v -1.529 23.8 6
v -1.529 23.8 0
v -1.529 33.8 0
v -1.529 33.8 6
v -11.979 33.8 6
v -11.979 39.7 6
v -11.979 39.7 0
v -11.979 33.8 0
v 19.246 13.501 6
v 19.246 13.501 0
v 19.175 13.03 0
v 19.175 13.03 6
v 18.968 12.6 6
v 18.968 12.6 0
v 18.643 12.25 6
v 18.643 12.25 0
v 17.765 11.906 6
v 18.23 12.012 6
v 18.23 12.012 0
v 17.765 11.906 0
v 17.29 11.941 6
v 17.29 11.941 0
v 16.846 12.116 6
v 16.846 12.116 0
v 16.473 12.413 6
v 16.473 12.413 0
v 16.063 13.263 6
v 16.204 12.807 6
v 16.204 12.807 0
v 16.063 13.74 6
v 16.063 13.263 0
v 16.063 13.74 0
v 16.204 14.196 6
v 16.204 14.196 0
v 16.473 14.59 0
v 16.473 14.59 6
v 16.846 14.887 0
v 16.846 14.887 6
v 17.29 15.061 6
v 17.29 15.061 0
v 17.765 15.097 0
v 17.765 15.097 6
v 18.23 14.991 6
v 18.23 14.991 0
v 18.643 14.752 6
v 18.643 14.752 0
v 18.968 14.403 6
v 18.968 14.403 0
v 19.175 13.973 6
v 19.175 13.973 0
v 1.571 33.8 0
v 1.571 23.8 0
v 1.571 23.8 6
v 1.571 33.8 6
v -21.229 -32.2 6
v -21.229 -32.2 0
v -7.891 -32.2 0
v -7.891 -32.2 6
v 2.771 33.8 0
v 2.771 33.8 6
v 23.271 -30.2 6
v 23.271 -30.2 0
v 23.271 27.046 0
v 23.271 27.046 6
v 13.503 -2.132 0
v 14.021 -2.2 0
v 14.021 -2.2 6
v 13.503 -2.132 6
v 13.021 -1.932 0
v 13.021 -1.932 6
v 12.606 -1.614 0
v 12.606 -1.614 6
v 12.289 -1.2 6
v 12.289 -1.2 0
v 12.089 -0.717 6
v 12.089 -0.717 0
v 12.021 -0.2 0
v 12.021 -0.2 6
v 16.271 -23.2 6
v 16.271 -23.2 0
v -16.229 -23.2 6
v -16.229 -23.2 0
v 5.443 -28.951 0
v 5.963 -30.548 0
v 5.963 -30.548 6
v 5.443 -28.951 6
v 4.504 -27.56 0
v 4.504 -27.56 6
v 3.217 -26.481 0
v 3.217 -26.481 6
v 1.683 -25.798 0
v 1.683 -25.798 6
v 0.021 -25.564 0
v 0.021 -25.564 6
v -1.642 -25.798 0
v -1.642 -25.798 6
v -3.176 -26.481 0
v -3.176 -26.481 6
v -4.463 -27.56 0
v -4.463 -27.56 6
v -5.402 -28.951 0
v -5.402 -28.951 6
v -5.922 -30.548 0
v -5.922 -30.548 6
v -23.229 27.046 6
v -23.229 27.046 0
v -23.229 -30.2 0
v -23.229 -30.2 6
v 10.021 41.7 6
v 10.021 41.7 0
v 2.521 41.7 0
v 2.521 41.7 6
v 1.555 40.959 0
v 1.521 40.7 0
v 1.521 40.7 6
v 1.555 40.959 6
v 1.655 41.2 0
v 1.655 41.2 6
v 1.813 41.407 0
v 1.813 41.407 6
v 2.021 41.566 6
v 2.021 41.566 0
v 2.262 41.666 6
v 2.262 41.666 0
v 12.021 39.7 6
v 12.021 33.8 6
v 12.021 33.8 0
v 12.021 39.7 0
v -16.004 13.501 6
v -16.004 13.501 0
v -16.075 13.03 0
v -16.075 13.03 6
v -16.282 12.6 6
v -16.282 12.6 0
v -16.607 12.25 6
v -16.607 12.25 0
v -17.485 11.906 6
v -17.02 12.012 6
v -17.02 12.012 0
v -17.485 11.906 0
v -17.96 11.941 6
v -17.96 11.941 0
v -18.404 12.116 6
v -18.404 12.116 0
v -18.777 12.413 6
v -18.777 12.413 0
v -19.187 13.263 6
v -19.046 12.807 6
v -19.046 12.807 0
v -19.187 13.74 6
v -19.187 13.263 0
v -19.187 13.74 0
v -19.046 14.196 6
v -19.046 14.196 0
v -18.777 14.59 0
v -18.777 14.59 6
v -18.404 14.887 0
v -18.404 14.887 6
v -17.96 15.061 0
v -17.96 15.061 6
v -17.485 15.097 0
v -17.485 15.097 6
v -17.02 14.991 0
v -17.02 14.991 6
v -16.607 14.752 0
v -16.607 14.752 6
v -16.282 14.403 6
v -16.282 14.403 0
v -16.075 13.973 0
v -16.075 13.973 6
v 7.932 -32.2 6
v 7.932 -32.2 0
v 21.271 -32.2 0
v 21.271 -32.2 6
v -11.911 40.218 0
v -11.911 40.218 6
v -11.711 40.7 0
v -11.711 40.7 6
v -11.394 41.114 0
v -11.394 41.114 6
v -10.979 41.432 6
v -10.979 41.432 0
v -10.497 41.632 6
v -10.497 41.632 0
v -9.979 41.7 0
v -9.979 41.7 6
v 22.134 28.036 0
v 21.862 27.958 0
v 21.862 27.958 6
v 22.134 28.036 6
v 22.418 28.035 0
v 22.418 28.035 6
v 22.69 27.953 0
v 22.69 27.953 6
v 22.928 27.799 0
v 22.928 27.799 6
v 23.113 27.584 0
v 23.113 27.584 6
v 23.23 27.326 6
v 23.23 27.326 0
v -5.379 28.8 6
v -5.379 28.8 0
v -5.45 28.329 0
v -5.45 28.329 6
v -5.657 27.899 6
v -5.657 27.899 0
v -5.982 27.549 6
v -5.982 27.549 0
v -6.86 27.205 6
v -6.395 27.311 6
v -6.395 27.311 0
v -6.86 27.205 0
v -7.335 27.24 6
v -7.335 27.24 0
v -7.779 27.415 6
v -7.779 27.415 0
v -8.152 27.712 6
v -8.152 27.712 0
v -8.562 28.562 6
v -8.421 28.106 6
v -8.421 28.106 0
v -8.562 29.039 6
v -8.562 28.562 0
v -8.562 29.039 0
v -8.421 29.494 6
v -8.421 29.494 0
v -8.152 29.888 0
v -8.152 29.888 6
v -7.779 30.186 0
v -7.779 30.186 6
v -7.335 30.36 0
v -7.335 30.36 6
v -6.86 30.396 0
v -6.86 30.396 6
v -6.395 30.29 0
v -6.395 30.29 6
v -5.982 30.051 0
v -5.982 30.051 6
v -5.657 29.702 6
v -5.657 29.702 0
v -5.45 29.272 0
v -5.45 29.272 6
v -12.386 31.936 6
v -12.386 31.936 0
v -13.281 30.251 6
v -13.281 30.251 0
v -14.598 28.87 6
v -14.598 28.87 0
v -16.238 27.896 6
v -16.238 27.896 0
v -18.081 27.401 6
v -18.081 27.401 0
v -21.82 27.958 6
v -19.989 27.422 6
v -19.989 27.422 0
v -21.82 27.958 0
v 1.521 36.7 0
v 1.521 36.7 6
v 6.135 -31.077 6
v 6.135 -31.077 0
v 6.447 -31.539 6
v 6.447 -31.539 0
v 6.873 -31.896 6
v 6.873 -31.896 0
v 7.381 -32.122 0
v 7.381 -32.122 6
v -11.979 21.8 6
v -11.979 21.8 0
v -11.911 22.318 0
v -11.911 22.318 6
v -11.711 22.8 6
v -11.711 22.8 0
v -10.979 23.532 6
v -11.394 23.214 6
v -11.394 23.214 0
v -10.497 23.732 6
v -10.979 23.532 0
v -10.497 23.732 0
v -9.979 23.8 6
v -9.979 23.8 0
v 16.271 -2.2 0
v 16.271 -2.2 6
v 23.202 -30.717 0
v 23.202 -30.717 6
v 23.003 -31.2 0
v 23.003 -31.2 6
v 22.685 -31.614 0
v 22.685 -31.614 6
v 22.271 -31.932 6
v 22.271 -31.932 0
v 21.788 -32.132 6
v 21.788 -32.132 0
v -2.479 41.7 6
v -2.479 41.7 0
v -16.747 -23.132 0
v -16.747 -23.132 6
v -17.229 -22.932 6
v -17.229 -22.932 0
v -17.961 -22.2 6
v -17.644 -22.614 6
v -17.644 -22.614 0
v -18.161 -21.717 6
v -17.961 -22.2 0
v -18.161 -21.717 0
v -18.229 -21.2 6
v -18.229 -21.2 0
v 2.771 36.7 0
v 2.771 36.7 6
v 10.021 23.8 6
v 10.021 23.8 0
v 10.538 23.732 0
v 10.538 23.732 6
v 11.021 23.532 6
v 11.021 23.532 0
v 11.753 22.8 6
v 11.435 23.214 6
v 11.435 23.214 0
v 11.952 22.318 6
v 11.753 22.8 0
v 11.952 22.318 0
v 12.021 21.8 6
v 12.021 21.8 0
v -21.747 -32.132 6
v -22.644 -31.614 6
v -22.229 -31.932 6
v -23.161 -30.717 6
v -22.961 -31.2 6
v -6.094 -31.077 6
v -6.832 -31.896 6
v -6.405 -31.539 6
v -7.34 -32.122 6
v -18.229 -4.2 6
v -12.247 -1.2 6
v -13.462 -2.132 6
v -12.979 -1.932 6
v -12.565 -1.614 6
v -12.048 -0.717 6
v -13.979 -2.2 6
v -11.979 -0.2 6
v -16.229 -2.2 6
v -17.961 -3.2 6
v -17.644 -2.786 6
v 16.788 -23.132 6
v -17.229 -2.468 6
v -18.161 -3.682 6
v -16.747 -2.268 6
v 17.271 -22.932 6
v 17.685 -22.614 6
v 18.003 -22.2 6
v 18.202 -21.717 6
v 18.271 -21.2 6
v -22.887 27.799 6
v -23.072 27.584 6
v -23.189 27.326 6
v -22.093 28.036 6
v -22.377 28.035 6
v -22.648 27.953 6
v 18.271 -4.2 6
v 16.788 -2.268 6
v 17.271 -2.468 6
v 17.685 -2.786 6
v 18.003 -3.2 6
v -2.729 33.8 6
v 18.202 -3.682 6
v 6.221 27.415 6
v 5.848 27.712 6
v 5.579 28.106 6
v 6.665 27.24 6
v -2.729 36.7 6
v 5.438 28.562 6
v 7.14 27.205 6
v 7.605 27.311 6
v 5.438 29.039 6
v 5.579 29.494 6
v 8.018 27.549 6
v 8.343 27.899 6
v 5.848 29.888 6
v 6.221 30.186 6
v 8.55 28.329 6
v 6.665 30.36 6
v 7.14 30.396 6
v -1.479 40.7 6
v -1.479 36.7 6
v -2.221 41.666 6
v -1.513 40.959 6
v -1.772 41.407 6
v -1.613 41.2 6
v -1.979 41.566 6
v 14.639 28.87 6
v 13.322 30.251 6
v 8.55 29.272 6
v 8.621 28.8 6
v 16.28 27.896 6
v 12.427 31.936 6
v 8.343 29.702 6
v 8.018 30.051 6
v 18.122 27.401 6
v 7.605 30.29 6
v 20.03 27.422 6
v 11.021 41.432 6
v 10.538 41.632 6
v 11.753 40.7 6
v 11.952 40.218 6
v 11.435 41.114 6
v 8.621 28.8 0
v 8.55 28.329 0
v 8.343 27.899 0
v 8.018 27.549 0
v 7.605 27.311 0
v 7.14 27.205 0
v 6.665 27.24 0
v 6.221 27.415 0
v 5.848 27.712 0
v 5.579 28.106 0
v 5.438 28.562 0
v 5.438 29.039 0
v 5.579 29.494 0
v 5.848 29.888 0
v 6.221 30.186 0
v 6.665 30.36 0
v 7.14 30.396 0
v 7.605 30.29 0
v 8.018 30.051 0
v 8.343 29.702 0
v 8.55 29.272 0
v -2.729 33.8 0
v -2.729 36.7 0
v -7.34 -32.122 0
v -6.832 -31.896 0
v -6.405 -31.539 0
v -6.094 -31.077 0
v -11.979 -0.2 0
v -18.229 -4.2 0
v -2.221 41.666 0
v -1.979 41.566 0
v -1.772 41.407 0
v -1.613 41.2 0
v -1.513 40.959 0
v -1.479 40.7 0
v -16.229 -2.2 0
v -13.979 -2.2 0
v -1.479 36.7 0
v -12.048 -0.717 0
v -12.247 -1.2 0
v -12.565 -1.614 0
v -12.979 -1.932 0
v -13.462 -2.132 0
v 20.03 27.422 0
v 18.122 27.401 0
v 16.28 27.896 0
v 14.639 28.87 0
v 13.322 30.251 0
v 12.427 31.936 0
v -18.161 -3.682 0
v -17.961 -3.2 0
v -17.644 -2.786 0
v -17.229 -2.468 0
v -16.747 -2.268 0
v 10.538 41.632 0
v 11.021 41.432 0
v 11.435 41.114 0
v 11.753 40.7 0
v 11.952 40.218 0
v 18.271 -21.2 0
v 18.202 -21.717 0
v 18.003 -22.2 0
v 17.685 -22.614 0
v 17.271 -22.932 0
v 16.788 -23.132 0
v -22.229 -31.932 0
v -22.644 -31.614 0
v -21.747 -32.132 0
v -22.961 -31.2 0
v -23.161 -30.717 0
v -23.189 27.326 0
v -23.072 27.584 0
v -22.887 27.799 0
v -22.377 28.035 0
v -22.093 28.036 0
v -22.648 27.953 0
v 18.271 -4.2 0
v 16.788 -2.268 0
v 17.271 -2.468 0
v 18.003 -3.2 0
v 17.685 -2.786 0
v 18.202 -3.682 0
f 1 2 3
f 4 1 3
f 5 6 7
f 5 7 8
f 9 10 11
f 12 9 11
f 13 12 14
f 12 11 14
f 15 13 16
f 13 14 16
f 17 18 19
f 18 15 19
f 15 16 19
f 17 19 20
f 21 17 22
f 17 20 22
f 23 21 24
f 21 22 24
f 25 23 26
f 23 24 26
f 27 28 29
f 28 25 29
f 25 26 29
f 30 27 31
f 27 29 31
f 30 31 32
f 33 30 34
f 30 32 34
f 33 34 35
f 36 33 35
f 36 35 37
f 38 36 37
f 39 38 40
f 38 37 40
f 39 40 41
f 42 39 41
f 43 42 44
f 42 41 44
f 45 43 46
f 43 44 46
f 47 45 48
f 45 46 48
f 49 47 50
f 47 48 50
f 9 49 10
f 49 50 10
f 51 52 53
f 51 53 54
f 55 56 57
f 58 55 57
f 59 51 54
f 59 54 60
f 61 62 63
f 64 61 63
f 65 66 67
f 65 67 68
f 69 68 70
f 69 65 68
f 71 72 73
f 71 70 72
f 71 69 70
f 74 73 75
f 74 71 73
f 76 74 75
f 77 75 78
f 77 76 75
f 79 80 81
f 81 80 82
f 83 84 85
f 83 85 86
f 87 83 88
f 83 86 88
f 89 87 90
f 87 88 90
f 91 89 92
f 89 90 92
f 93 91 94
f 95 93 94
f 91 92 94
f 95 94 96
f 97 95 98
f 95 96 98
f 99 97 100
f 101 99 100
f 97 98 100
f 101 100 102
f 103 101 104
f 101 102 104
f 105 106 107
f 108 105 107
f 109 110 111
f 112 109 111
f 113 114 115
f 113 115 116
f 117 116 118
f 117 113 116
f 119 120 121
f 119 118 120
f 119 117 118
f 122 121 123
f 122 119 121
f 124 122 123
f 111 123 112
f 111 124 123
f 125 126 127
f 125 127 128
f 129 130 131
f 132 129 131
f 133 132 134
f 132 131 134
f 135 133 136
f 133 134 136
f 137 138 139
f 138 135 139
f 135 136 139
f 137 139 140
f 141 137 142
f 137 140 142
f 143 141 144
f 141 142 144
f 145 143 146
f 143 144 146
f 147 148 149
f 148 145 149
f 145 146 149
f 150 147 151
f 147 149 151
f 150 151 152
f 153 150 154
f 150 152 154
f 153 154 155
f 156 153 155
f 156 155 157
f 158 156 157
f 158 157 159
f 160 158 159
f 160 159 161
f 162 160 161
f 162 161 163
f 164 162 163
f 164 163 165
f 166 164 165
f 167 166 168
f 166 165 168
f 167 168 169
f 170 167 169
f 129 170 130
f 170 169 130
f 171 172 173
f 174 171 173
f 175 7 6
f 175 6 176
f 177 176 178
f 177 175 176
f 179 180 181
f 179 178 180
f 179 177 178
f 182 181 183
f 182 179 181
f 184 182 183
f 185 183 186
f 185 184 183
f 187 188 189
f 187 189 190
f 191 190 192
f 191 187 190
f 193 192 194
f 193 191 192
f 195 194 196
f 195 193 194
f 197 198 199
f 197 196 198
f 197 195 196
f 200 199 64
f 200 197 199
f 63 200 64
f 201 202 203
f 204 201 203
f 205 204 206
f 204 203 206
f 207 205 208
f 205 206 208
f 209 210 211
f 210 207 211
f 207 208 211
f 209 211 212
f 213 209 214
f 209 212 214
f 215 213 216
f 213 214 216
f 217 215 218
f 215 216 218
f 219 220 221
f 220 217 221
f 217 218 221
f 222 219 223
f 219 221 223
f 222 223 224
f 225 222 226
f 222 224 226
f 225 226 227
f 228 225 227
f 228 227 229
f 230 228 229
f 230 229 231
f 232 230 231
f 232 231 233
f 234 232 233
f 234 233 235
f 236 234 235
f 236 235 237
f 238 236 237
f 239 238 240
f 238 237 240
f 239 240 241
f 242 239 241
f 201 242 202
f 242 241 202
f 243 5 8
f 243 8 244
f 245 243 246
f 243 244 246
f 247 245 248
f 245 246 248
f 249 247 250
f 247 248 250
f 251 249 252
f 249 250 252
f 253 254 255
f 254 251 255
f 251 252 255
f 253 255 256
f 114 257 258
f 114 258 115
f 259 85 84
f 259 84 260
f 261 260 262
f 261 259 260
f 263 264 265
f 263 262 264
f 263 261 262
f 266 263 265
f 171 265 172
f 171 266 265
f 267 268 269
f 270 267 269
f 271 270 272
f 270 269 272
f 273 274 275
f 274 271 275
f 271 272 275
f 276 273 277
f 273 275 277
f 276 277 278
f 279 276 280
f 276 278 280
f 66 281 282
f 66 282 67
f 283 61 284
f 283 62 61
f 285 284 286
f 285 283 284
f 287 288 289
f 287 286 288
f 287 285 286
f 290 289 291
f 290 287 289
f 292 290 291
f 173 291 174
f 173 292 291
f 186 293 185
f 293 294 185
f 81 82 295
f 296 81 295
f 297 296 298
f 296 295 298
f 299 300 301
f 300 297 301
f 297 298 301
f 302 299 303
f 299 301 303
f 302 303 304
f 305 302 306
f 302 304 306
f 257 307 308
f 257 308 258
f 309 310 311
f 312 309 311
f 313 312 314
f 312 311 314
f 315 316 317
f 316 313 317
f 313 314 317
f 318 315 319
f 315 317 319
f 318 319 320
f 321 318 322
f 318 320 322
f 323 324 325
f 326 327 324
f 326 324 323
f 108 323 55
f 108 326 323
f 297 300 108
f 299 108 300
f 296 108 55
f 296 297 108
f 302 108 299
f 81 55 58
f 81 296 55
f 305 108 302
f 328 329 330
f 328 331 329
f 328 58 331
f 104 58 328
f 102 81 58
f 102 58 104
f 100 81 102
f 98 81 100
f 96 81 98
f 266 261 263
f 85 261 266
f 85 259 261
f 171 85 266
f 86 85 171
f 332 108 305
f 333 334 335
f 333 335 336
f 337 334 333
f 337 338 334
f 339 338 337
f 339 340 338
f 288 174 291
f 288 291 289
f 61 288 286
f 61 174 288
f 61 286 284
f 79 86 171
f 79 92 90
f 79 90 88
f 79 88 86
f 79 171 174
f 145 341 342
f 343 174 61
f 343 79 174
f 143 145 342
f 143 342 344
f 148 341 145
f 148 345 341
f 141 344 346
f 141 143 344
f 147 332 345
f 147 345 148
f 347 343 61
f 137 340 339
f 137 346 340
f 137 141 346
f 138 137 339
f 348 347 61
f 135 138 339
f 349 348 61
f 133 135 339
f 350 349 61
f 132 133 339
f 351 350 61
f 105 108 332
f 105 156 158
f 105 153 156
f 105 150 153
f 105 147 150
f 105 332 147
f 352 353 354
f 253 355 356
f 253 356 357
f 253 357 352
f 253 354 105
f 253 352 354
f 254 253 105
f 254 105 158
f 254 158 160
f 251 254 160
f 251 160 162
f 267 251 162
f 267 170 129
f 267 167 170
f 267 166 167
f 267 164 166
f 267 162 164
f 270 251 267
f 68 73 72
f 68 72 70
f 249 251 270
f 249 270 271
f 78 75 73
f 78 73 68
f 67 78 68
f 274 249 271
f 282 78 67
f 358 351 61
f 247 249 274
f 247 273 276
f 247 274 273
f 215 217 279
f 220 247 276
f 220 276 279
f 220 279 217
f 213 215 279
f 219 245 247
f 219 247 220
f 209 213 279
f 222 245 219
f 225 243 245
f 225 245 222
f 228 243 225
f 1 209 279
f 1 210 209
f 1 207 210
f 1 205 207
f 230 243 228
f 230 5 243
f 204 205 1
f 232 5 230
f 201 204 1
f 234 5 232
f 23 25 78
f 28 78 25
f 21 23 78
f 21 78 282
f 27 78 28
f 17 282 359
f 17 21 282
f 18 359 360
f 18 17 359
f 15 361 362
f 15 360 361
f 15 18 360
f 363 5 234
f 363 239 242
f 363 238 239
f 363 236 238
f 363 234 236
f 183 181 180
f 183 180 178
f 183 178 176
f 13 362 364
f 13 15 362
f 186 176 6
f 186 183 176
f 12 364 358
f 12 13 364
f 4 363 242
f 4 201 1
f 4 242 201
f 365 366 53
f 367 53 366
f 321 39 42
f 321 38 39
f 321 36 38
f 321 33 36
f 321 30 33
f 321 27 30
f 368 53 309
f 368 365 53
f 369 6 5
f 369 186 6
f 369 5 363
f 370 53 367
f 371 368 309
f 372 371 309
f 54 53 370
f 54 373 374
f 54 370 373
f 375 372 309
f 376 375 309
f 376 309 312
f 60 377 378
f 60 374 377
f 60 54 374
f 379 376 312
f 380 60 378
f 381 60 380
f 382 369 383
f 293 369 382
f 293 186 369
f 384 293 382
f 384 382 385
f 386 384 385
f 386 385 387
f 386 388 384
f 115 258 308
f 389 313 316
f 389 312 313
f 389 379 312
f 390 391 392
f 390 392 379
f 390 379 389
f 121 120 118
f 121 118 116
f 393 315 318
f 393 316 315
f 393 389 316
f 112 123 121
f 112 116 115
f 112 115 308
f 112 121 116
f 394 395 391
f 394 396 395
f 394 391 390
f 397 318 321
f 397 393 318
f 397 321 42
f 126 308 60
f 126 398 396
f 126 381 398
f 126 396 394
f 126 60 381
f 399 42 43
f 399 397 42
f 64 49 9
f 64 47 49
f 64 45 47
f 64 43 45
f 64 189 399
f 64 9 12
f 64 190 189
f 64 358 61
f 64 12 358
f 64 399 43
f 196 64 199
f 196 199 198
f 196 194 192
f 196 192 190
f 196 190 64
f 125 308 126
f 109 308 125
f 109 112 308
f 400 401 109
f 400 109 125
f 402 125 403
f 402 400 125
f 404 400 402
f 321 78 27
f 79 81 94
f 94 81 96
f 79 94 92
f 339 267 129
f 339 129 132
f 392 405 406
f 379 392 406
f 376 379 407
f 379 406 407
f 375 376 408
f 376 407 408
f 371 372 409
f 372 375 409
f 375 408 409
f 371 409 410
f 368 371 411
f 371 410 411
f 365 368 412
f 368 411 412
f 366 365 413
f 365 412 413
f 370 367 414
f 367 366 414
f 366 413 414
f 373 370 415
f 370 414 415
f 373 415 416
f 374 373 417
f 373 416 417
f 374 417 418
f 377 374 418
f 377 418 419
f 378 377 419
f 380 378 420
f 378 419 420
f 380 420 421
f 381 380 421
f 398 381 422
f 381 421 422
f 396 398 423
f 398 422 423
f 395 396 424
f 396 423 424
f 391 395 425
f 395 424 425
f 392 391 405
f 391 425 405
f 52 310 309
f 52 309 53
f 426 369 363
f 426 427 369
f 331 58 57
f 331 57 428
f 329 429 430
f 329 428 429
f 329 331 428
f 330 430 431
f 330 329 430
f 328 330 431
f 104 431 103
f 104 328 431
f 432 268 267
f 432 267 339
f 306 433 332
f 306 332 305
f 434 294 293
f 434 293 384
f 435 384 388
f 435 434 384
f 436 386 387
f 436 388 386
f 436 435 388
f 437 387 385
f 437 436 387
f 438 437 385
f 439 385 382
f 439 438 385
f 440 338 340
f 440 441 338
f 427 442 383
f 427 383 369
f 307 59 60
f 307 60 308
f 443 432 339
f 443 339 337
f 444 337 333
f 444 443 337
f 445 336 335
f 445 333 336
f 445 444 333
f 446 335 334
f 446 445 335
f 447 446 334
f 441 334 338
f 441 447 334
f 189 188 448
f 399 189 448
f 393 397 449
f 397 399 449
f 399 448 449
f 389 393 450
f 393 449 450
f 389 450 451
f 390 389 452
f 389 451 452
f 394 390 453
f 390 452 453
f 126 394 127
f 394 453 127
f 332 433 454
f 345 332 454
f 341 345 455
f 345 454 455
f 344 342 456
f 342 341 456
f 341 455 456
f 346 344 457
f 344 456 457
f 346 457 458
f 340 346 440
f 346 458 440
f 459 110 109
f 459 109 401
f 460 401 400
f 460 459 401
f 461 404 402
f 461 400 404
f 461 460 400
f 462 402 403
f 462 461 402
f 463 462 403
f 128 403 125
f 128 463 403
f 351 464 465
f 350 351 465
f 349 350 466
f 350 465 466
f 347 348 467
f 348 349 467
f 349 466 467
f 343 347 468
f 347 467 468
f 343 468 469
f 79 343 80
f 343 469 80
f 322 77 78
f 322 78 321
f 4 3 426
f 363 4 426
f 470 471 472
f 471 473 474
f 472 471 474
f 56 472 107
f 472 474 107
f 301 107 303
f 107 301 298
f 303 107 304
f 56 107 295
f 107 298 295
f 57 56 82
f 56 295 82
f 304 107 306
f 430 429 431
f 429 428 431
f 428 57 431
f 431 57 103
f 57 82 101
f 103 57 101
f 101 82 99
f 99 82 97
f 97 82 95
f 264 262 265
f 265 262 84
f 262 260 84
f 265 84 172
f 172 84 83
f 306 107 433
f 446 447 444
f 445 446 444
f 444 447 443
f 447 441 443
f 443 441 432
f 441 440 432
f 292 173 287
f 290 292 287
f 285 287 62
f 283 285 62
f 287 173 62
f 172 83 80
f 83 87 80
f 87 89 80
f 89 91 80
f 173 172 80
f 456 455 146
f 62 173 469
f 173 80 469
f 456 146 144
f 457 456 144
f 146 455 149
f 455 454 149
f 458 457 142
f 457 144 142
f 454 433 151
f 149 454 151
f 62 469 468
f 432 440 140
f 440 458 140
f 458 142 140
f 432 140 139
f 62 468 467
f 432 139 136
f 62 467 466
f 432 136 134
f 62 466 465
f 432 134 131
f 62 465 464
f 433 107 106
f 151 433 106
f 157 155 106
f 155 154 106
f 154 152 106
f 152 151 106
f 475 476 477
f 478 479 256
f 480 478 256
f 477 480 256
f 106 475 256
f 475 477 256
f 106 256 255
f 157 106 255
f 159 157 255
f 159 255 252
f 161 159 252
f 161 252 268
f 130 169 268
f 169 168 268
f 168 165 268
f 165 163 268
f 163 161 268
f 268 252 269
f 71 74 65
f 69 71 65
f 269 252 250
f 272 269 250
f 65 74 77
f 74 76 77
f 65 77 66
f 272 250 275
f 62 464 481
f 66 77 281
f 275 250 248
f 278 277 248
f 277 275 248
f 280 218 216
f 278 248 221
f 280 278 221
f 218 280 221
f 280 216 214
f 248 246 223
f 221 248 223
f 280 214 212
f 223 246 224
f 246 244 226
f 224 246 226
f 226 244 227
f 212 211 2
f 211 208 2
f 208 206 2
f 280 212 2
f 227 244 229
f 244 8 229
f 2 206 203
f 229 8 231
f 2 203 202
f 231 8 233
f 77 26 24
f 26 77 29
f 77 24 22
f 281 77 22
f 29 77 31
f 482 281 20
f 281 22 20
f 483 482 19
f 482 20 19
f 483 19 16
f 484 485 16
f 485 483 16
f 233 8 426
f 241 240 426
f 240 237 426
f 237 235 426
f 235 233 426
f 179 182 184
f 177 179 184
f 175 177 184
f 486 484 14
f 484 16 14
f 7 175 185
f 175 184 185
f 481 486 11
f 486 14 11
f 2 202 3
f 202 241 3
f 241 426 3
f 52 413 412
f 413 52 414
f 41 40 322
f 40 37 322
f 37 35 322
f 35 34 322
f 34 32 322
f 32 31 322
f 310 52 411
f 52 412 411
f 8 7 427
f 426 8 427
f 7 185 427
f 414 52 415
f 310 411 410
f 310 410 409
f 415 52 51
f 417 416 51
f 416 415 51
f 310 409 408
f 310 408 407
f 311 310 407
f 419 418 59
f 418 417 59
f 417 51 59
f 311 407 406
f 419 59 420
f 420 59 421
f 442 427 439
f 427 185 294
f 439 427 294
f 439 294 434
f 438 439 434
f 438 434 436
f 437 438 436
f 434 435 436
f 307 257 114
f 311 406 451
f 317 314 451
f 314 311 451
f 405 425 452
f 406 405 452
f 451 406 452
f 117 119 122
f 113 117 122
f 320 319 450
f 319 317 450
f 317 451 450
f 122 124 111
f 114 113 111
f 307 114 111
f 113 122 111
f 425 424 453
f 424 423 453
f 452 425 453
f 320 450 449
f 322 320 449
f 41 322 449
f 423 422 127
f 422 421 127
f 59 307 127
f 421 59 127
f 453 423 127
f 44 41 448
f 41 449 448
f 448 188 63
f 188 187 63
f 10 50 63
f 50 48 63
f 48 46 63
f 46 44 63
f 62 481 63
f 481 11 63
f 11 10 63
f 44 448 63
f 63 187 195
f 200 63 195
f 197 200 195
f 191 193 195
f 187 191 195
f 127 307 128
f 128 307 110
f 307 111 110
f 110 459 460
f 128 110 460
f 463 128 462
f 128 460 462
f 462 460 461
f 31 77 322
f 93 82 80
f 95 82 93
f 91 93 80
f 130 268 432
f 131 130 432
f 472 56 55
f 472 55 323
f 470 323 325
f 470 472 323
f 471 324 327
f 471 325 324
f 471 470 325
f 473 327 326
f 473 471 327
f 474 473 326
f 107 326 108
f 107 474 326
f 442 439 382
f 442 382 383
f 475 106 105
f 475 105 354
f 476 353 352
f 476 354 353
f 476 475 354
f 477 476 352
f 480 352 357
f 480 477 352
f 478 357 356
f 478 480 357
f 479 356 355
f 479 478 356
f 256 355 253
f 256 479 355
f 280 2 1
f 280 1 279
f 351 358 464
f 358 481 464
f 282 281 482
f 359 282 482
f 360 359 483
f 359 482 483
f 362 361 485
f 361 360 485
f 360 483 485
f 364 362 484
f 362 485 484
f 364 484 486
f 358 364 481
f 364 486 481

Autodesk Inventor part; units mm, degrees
ref_plane "YZ Plane" through (0, 0, 0) normal (1, 0, 0) x (0, 1, 0)
ref_plane "XZ Plane" through (0, 0, 0) normal (0, 1, 0) x (-1, 0, 0)
ref_plane "XY Plane" through (0, 0, 0) normal (0, 0, 1) x (1, 0, 0)
sketch "Sketch1" plane through (0, 0, 0) normal (0, 0, 1) x (1, 0, 0)
  line L0 (-11.9794, 21.8002) -> (-11.9794, -0.1998)
  line L1 (-13.9794, -2.1998) -> (-16.2294, -2.1998)
  line L2 (12.0206, -0.1998) -> (12.0206, 21.8002)
  line L3 (16.2706, -2.1998) -> (14.0206, -2.1998)
  line L4 (-23.2294, -2.1998) -> (-23.2294, 27.0455)
  line L5 (23.2706, -2.1998) -> (23.2706, 27.0455)
  line L6 (-1.5294, 33.8002) -> (-2.7294, 33.8002)
  line L7 (1.5706, 33.8002) -> (2.7706, 33.8002)
  arc A0 (12.0206, 33.8002) -> (21.8617, 27.958) centre (18.9993, 34.346) ccw
  arc A1 (-21.8205, 27.958) -> (-11.9794, 33.8002) centre (-18.9581, 34.346) ccw
  line L8 (-1.5294, 23.8002) -> (-1.5294, 33.8002)
  line L9 (1.5706, 23.8002) -> (1.5706, 33.8002)
  circle A2 centre (17.6456, 13.5013) radius 1.6
  circle A3 centre (-17.6044, 13.5013) radius 1.6
  circle A4 centre (7.0206, 28.8002) radius 1.6
  circle A5 centre (-6.9794, 28.8002) radius 1.6
  line L10 (-1.5294, 33.8002) -> (-2.7294, 33.8002)
  line L11 (2.7706, 33.8002) -> (2.7706, 36.7002)
  line L12 (-2.7294, 36.7002) -> (-2.7294, 33.8002)
  line L13 (-2.4794, 41.7002) -> (-9.9794, 41.7002)
  line L14 (-11.9794, 39.7002) -> (-11.9794, 33.8002)
  line L15 (12.0206, 33.8002) -> (12.0206, 39.7002)
  line L16 (10.0206, 41.7002) -> (2.5206, 41.7002)
  line L17 (1.5206, 36.7002) -> (1.5206, 40.7002)
  line L18 (-1.4794, 40.7002) -> (-1.4794, 36.7002)
  arc A6 (-9.9794, 23.8002) -> (-11.9794, 21.8002) centre (-9.9794, 21.8002) ccw
  arc A7 (12.0206, 21.8002) -> (10.0206, 23.8002) centre (10.0206, 21.8002) ccw
  arc A8 (12.0206, -0.1998) -> (14.0206, -2.1998) centre (14.0206, -0.1998) ccw
  arc A9 (-13.9794, -2.1998) -> (-11.9794, -0.1998) centre (-13.9794, -0.1998) ccw
  arc A10 (12.0206, 39.7002) -> (10.0206, 41.7002) centre (10.0206, 39.7002) ccw
  arc A11 (-9.9794, 41.7002) -> (-11.9794, 39.7002) centre (-9.9794, 39.7002) ccw
  arc A12 (-1.4794, 40.7002) -> (-2.4794, 41.7002) centre (-2.4794, 40.7002) ccw
  arc A13 (2.5206, 41.7002) -> (1.5206, 40.7002) centre (2.5206, 40.7002) ccw
  arc A14 (23.2706, 27.0455) -> (21.8617, 27.958) centre (22.2706, 27.0455) ccw
  arc A15 (-21.8205, 27.958) -> (-23.2294, 27.0455) centre (-22.2294, 27.0455) ccw
  line L19 (-23.2294, -2.1998) -> (-23.2294, -30.1998)
  line L20 (-21.2294, -32.1998) -> (21.2706, -32.1998)
  line L21 (23.2706, -30.1998) -> (23.2706, -2.1998)
  line L22 (-18.2294, -4.1998) -> (-18.2294, -21.1998)
  line L23 (18.2706, -4.1998) -> (18.2706, -21.1998)
  line L24 (16.2706, -23.1998) -> (-16.2294, -23.1998)
  arc A16 (-18.2294, -21.1998) -> (-16.2294, -23.1998) centre (-16.2294, -21.1998) ccw
  arc A17 (16.2706, -23.1998) -> (18.2706, -21.1998) centre (16.2706, -21.1998) ccw
  arc A18 (18.2706, -4.1998) -> (16.2706, -2.1998) centre (16.2706, -4.1998) ccw
  arc A19 (-16.2294, -2.1998) -> (-18.2294, -4.1998) centre (-16.2294, -4.1998) ccw
  arc A20 (21.2706, -32.1998) -> (23.2706, -30.1998) centre (21.2706, -30.1998) ccw
  arc A21 (-23.2294, -30.1998) -> (-21.2294, -32.1998) centre (-21.2294, -30.1998) ccw
  line L25 (10.0206, 23.8002) -> (1.5706, 23.8002)
  line L26 (-1.5294, 23.8002) -> (-9.9794, 23.8002)
  line L27 (-2.7294, 33.8002) -> (-1.5294, 33.8002)
  line L28 (1.5706, 33.8002) -> (2.7706, 33.8002)
  line L29 (2.7706, 36.7002) -> (1.5206, 36.7002)
  line L30 (-1.4794, 36.7002) -> (-2.7294, 36.7002)
  point P0 (0, 0)
  point P1 (0, 0)
  point P2 (-23.2294, 28.8002)
  point P3 (23.2706, 28.8002)
  point P4 (-23.2294, -32.1998)
  point P5 (-18.2294, -23.1998)
  dimension "d0" = 31
  dimension "d1" = 7
  dimension "d2" = 7
  dimension "d6" = 2
  dimension "d8" = 30
  dimension "d13" = 2
extrude "Extrusion1" add sketch "Sketch1" along normal blind 6
sketch "Sketch2" plane through (0, 0, 6) normal (0, 0, 1) x (1, 0, 0)
  line L0 (-21.2294, -32.1998) -> (21.2706, -32.1998) projected
  line L1 (0.0206, -32.1998) -> (0.0206, -28.1998)
  line L2 (0.0206, -28.1998) -> (0.0206, -34.998)
  line L3 (0.0206, -34.998) -> (0.0206, -28.1998)
  circle A0 centre (0.0206, -31.5989) radius 5.0514
  circle A1 centre (0.0206, -31.5989) radius 6.0346
  point P0 (0, 0)
  dimension "d16" = 4
extrude "Extrusion2" cut sketch "Sketch2" against normal blind 6
fillet "Fillet1" radius 2 2 edges at (6.0253, -32.1998, 3) (-5.984, -32.1998, 3)
properties part number "Hotend Slide Part 2" material "Acetal Resin, White"
